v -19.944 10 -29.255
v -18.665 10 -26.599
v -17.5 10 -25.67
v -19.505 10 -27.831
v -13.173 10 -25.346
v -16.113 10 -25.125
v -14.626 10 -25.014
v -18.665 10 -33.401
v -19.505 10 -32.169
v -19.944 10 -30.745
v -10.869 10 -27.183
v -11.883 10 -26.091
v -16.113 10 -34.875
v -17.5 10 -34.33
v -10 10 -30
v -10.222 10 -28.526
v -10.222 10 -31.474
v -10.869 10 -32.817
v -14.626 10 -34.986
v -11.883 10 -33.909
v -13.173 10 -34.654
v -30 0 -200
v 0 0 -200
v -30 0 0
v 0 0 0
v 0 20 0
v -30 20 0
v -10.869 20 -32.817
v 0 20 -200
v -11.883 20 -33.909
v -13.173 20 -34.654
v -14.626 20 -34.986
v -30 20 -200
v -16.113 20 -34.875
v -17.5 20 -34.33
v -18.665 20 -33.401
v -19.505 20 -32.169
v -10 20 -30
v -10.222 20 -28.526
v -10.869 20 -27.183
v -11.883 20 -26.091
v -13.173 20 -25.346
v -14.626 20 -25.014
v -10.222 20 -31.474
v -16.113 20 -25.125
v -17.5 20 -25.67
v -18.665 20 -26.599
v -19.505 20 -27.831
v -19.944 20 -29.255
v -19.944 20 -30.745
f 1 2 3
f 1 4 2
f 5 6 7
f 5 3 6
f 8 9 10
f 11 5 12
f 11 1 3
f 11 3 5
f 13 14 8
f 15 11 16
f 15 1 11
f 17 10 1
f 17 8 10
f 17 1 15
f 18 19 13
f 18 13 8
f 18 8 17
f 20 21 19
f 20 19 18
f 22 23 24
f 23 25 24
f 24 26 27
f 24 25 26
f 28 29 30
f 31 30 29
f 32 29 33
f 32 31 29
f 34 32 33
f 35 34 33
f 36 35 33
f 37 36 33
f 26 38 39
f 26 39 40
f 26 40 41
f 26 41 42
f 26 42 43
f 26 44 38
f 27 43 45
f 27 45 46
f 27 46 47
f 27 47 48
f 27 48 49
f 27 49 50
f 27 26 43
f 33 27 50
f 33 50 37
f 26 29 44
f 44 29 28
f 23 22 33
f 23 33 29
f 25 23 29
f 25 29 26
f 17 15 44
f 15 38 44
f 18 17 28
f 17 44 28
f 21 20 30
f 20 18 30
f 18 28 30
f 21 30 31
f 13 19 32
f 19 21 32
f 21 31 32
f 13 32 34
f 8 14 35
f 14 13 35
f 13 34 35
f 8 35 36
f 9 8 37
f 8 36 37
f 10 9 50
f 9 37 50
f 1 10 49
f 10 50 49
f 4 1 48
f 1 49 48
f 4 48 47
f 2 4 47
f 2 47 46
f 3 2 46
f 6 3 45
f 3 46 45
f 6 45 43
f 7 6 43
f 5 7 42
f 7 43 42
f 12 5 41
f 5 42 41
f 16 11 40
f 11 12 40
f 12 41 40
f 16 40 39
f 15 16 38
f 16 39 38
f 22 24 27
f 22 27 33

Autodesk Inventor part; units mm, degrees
ref_plane "YZ Plane" through (0, 0, 0) normal (1, 0, 0) x (0, 1, 0)
ref_plane "XZ Plane" through (0, 0, 0) normal (0, 1, 0) x (-1, 0, 0)
ref_plane "XY Plane" through (0, 0, 0) normal (0, 0, 1) x (1, 0, 0)
sketch "Esboço1" plane through (0, 0, 0) normal (0, 1, 0) x (-1, 0, 0)
  line L0 (0, 0) -> (30, 0)
  line L1 (30, 0) -> (30, -200)
  line L2 (30, -200) -> (0, -200)
  line L3 (0, -200) -> (0, 0)
  dimension "d0" = 30
  dimension "d1" = 200
extrude "Extrusão1" add sketch "Esboço1" along normal blind 20
sketch "Esboço2" plane through (0, 20, 0) normal (0, 1, 0) x (1, 0, 0)
  line L0 (-30, 0) -> (0, 0) projected
  line L1 (-15, 0) -> (-15, 30)
  circle A0 centre (-15, 30) radius 5
  dimension "d4" = 30
  dimension "d5" = 10
extrude "Extrusão2" cut sketch "Esboço2" against normal blind 10
properties part number "Superior"
